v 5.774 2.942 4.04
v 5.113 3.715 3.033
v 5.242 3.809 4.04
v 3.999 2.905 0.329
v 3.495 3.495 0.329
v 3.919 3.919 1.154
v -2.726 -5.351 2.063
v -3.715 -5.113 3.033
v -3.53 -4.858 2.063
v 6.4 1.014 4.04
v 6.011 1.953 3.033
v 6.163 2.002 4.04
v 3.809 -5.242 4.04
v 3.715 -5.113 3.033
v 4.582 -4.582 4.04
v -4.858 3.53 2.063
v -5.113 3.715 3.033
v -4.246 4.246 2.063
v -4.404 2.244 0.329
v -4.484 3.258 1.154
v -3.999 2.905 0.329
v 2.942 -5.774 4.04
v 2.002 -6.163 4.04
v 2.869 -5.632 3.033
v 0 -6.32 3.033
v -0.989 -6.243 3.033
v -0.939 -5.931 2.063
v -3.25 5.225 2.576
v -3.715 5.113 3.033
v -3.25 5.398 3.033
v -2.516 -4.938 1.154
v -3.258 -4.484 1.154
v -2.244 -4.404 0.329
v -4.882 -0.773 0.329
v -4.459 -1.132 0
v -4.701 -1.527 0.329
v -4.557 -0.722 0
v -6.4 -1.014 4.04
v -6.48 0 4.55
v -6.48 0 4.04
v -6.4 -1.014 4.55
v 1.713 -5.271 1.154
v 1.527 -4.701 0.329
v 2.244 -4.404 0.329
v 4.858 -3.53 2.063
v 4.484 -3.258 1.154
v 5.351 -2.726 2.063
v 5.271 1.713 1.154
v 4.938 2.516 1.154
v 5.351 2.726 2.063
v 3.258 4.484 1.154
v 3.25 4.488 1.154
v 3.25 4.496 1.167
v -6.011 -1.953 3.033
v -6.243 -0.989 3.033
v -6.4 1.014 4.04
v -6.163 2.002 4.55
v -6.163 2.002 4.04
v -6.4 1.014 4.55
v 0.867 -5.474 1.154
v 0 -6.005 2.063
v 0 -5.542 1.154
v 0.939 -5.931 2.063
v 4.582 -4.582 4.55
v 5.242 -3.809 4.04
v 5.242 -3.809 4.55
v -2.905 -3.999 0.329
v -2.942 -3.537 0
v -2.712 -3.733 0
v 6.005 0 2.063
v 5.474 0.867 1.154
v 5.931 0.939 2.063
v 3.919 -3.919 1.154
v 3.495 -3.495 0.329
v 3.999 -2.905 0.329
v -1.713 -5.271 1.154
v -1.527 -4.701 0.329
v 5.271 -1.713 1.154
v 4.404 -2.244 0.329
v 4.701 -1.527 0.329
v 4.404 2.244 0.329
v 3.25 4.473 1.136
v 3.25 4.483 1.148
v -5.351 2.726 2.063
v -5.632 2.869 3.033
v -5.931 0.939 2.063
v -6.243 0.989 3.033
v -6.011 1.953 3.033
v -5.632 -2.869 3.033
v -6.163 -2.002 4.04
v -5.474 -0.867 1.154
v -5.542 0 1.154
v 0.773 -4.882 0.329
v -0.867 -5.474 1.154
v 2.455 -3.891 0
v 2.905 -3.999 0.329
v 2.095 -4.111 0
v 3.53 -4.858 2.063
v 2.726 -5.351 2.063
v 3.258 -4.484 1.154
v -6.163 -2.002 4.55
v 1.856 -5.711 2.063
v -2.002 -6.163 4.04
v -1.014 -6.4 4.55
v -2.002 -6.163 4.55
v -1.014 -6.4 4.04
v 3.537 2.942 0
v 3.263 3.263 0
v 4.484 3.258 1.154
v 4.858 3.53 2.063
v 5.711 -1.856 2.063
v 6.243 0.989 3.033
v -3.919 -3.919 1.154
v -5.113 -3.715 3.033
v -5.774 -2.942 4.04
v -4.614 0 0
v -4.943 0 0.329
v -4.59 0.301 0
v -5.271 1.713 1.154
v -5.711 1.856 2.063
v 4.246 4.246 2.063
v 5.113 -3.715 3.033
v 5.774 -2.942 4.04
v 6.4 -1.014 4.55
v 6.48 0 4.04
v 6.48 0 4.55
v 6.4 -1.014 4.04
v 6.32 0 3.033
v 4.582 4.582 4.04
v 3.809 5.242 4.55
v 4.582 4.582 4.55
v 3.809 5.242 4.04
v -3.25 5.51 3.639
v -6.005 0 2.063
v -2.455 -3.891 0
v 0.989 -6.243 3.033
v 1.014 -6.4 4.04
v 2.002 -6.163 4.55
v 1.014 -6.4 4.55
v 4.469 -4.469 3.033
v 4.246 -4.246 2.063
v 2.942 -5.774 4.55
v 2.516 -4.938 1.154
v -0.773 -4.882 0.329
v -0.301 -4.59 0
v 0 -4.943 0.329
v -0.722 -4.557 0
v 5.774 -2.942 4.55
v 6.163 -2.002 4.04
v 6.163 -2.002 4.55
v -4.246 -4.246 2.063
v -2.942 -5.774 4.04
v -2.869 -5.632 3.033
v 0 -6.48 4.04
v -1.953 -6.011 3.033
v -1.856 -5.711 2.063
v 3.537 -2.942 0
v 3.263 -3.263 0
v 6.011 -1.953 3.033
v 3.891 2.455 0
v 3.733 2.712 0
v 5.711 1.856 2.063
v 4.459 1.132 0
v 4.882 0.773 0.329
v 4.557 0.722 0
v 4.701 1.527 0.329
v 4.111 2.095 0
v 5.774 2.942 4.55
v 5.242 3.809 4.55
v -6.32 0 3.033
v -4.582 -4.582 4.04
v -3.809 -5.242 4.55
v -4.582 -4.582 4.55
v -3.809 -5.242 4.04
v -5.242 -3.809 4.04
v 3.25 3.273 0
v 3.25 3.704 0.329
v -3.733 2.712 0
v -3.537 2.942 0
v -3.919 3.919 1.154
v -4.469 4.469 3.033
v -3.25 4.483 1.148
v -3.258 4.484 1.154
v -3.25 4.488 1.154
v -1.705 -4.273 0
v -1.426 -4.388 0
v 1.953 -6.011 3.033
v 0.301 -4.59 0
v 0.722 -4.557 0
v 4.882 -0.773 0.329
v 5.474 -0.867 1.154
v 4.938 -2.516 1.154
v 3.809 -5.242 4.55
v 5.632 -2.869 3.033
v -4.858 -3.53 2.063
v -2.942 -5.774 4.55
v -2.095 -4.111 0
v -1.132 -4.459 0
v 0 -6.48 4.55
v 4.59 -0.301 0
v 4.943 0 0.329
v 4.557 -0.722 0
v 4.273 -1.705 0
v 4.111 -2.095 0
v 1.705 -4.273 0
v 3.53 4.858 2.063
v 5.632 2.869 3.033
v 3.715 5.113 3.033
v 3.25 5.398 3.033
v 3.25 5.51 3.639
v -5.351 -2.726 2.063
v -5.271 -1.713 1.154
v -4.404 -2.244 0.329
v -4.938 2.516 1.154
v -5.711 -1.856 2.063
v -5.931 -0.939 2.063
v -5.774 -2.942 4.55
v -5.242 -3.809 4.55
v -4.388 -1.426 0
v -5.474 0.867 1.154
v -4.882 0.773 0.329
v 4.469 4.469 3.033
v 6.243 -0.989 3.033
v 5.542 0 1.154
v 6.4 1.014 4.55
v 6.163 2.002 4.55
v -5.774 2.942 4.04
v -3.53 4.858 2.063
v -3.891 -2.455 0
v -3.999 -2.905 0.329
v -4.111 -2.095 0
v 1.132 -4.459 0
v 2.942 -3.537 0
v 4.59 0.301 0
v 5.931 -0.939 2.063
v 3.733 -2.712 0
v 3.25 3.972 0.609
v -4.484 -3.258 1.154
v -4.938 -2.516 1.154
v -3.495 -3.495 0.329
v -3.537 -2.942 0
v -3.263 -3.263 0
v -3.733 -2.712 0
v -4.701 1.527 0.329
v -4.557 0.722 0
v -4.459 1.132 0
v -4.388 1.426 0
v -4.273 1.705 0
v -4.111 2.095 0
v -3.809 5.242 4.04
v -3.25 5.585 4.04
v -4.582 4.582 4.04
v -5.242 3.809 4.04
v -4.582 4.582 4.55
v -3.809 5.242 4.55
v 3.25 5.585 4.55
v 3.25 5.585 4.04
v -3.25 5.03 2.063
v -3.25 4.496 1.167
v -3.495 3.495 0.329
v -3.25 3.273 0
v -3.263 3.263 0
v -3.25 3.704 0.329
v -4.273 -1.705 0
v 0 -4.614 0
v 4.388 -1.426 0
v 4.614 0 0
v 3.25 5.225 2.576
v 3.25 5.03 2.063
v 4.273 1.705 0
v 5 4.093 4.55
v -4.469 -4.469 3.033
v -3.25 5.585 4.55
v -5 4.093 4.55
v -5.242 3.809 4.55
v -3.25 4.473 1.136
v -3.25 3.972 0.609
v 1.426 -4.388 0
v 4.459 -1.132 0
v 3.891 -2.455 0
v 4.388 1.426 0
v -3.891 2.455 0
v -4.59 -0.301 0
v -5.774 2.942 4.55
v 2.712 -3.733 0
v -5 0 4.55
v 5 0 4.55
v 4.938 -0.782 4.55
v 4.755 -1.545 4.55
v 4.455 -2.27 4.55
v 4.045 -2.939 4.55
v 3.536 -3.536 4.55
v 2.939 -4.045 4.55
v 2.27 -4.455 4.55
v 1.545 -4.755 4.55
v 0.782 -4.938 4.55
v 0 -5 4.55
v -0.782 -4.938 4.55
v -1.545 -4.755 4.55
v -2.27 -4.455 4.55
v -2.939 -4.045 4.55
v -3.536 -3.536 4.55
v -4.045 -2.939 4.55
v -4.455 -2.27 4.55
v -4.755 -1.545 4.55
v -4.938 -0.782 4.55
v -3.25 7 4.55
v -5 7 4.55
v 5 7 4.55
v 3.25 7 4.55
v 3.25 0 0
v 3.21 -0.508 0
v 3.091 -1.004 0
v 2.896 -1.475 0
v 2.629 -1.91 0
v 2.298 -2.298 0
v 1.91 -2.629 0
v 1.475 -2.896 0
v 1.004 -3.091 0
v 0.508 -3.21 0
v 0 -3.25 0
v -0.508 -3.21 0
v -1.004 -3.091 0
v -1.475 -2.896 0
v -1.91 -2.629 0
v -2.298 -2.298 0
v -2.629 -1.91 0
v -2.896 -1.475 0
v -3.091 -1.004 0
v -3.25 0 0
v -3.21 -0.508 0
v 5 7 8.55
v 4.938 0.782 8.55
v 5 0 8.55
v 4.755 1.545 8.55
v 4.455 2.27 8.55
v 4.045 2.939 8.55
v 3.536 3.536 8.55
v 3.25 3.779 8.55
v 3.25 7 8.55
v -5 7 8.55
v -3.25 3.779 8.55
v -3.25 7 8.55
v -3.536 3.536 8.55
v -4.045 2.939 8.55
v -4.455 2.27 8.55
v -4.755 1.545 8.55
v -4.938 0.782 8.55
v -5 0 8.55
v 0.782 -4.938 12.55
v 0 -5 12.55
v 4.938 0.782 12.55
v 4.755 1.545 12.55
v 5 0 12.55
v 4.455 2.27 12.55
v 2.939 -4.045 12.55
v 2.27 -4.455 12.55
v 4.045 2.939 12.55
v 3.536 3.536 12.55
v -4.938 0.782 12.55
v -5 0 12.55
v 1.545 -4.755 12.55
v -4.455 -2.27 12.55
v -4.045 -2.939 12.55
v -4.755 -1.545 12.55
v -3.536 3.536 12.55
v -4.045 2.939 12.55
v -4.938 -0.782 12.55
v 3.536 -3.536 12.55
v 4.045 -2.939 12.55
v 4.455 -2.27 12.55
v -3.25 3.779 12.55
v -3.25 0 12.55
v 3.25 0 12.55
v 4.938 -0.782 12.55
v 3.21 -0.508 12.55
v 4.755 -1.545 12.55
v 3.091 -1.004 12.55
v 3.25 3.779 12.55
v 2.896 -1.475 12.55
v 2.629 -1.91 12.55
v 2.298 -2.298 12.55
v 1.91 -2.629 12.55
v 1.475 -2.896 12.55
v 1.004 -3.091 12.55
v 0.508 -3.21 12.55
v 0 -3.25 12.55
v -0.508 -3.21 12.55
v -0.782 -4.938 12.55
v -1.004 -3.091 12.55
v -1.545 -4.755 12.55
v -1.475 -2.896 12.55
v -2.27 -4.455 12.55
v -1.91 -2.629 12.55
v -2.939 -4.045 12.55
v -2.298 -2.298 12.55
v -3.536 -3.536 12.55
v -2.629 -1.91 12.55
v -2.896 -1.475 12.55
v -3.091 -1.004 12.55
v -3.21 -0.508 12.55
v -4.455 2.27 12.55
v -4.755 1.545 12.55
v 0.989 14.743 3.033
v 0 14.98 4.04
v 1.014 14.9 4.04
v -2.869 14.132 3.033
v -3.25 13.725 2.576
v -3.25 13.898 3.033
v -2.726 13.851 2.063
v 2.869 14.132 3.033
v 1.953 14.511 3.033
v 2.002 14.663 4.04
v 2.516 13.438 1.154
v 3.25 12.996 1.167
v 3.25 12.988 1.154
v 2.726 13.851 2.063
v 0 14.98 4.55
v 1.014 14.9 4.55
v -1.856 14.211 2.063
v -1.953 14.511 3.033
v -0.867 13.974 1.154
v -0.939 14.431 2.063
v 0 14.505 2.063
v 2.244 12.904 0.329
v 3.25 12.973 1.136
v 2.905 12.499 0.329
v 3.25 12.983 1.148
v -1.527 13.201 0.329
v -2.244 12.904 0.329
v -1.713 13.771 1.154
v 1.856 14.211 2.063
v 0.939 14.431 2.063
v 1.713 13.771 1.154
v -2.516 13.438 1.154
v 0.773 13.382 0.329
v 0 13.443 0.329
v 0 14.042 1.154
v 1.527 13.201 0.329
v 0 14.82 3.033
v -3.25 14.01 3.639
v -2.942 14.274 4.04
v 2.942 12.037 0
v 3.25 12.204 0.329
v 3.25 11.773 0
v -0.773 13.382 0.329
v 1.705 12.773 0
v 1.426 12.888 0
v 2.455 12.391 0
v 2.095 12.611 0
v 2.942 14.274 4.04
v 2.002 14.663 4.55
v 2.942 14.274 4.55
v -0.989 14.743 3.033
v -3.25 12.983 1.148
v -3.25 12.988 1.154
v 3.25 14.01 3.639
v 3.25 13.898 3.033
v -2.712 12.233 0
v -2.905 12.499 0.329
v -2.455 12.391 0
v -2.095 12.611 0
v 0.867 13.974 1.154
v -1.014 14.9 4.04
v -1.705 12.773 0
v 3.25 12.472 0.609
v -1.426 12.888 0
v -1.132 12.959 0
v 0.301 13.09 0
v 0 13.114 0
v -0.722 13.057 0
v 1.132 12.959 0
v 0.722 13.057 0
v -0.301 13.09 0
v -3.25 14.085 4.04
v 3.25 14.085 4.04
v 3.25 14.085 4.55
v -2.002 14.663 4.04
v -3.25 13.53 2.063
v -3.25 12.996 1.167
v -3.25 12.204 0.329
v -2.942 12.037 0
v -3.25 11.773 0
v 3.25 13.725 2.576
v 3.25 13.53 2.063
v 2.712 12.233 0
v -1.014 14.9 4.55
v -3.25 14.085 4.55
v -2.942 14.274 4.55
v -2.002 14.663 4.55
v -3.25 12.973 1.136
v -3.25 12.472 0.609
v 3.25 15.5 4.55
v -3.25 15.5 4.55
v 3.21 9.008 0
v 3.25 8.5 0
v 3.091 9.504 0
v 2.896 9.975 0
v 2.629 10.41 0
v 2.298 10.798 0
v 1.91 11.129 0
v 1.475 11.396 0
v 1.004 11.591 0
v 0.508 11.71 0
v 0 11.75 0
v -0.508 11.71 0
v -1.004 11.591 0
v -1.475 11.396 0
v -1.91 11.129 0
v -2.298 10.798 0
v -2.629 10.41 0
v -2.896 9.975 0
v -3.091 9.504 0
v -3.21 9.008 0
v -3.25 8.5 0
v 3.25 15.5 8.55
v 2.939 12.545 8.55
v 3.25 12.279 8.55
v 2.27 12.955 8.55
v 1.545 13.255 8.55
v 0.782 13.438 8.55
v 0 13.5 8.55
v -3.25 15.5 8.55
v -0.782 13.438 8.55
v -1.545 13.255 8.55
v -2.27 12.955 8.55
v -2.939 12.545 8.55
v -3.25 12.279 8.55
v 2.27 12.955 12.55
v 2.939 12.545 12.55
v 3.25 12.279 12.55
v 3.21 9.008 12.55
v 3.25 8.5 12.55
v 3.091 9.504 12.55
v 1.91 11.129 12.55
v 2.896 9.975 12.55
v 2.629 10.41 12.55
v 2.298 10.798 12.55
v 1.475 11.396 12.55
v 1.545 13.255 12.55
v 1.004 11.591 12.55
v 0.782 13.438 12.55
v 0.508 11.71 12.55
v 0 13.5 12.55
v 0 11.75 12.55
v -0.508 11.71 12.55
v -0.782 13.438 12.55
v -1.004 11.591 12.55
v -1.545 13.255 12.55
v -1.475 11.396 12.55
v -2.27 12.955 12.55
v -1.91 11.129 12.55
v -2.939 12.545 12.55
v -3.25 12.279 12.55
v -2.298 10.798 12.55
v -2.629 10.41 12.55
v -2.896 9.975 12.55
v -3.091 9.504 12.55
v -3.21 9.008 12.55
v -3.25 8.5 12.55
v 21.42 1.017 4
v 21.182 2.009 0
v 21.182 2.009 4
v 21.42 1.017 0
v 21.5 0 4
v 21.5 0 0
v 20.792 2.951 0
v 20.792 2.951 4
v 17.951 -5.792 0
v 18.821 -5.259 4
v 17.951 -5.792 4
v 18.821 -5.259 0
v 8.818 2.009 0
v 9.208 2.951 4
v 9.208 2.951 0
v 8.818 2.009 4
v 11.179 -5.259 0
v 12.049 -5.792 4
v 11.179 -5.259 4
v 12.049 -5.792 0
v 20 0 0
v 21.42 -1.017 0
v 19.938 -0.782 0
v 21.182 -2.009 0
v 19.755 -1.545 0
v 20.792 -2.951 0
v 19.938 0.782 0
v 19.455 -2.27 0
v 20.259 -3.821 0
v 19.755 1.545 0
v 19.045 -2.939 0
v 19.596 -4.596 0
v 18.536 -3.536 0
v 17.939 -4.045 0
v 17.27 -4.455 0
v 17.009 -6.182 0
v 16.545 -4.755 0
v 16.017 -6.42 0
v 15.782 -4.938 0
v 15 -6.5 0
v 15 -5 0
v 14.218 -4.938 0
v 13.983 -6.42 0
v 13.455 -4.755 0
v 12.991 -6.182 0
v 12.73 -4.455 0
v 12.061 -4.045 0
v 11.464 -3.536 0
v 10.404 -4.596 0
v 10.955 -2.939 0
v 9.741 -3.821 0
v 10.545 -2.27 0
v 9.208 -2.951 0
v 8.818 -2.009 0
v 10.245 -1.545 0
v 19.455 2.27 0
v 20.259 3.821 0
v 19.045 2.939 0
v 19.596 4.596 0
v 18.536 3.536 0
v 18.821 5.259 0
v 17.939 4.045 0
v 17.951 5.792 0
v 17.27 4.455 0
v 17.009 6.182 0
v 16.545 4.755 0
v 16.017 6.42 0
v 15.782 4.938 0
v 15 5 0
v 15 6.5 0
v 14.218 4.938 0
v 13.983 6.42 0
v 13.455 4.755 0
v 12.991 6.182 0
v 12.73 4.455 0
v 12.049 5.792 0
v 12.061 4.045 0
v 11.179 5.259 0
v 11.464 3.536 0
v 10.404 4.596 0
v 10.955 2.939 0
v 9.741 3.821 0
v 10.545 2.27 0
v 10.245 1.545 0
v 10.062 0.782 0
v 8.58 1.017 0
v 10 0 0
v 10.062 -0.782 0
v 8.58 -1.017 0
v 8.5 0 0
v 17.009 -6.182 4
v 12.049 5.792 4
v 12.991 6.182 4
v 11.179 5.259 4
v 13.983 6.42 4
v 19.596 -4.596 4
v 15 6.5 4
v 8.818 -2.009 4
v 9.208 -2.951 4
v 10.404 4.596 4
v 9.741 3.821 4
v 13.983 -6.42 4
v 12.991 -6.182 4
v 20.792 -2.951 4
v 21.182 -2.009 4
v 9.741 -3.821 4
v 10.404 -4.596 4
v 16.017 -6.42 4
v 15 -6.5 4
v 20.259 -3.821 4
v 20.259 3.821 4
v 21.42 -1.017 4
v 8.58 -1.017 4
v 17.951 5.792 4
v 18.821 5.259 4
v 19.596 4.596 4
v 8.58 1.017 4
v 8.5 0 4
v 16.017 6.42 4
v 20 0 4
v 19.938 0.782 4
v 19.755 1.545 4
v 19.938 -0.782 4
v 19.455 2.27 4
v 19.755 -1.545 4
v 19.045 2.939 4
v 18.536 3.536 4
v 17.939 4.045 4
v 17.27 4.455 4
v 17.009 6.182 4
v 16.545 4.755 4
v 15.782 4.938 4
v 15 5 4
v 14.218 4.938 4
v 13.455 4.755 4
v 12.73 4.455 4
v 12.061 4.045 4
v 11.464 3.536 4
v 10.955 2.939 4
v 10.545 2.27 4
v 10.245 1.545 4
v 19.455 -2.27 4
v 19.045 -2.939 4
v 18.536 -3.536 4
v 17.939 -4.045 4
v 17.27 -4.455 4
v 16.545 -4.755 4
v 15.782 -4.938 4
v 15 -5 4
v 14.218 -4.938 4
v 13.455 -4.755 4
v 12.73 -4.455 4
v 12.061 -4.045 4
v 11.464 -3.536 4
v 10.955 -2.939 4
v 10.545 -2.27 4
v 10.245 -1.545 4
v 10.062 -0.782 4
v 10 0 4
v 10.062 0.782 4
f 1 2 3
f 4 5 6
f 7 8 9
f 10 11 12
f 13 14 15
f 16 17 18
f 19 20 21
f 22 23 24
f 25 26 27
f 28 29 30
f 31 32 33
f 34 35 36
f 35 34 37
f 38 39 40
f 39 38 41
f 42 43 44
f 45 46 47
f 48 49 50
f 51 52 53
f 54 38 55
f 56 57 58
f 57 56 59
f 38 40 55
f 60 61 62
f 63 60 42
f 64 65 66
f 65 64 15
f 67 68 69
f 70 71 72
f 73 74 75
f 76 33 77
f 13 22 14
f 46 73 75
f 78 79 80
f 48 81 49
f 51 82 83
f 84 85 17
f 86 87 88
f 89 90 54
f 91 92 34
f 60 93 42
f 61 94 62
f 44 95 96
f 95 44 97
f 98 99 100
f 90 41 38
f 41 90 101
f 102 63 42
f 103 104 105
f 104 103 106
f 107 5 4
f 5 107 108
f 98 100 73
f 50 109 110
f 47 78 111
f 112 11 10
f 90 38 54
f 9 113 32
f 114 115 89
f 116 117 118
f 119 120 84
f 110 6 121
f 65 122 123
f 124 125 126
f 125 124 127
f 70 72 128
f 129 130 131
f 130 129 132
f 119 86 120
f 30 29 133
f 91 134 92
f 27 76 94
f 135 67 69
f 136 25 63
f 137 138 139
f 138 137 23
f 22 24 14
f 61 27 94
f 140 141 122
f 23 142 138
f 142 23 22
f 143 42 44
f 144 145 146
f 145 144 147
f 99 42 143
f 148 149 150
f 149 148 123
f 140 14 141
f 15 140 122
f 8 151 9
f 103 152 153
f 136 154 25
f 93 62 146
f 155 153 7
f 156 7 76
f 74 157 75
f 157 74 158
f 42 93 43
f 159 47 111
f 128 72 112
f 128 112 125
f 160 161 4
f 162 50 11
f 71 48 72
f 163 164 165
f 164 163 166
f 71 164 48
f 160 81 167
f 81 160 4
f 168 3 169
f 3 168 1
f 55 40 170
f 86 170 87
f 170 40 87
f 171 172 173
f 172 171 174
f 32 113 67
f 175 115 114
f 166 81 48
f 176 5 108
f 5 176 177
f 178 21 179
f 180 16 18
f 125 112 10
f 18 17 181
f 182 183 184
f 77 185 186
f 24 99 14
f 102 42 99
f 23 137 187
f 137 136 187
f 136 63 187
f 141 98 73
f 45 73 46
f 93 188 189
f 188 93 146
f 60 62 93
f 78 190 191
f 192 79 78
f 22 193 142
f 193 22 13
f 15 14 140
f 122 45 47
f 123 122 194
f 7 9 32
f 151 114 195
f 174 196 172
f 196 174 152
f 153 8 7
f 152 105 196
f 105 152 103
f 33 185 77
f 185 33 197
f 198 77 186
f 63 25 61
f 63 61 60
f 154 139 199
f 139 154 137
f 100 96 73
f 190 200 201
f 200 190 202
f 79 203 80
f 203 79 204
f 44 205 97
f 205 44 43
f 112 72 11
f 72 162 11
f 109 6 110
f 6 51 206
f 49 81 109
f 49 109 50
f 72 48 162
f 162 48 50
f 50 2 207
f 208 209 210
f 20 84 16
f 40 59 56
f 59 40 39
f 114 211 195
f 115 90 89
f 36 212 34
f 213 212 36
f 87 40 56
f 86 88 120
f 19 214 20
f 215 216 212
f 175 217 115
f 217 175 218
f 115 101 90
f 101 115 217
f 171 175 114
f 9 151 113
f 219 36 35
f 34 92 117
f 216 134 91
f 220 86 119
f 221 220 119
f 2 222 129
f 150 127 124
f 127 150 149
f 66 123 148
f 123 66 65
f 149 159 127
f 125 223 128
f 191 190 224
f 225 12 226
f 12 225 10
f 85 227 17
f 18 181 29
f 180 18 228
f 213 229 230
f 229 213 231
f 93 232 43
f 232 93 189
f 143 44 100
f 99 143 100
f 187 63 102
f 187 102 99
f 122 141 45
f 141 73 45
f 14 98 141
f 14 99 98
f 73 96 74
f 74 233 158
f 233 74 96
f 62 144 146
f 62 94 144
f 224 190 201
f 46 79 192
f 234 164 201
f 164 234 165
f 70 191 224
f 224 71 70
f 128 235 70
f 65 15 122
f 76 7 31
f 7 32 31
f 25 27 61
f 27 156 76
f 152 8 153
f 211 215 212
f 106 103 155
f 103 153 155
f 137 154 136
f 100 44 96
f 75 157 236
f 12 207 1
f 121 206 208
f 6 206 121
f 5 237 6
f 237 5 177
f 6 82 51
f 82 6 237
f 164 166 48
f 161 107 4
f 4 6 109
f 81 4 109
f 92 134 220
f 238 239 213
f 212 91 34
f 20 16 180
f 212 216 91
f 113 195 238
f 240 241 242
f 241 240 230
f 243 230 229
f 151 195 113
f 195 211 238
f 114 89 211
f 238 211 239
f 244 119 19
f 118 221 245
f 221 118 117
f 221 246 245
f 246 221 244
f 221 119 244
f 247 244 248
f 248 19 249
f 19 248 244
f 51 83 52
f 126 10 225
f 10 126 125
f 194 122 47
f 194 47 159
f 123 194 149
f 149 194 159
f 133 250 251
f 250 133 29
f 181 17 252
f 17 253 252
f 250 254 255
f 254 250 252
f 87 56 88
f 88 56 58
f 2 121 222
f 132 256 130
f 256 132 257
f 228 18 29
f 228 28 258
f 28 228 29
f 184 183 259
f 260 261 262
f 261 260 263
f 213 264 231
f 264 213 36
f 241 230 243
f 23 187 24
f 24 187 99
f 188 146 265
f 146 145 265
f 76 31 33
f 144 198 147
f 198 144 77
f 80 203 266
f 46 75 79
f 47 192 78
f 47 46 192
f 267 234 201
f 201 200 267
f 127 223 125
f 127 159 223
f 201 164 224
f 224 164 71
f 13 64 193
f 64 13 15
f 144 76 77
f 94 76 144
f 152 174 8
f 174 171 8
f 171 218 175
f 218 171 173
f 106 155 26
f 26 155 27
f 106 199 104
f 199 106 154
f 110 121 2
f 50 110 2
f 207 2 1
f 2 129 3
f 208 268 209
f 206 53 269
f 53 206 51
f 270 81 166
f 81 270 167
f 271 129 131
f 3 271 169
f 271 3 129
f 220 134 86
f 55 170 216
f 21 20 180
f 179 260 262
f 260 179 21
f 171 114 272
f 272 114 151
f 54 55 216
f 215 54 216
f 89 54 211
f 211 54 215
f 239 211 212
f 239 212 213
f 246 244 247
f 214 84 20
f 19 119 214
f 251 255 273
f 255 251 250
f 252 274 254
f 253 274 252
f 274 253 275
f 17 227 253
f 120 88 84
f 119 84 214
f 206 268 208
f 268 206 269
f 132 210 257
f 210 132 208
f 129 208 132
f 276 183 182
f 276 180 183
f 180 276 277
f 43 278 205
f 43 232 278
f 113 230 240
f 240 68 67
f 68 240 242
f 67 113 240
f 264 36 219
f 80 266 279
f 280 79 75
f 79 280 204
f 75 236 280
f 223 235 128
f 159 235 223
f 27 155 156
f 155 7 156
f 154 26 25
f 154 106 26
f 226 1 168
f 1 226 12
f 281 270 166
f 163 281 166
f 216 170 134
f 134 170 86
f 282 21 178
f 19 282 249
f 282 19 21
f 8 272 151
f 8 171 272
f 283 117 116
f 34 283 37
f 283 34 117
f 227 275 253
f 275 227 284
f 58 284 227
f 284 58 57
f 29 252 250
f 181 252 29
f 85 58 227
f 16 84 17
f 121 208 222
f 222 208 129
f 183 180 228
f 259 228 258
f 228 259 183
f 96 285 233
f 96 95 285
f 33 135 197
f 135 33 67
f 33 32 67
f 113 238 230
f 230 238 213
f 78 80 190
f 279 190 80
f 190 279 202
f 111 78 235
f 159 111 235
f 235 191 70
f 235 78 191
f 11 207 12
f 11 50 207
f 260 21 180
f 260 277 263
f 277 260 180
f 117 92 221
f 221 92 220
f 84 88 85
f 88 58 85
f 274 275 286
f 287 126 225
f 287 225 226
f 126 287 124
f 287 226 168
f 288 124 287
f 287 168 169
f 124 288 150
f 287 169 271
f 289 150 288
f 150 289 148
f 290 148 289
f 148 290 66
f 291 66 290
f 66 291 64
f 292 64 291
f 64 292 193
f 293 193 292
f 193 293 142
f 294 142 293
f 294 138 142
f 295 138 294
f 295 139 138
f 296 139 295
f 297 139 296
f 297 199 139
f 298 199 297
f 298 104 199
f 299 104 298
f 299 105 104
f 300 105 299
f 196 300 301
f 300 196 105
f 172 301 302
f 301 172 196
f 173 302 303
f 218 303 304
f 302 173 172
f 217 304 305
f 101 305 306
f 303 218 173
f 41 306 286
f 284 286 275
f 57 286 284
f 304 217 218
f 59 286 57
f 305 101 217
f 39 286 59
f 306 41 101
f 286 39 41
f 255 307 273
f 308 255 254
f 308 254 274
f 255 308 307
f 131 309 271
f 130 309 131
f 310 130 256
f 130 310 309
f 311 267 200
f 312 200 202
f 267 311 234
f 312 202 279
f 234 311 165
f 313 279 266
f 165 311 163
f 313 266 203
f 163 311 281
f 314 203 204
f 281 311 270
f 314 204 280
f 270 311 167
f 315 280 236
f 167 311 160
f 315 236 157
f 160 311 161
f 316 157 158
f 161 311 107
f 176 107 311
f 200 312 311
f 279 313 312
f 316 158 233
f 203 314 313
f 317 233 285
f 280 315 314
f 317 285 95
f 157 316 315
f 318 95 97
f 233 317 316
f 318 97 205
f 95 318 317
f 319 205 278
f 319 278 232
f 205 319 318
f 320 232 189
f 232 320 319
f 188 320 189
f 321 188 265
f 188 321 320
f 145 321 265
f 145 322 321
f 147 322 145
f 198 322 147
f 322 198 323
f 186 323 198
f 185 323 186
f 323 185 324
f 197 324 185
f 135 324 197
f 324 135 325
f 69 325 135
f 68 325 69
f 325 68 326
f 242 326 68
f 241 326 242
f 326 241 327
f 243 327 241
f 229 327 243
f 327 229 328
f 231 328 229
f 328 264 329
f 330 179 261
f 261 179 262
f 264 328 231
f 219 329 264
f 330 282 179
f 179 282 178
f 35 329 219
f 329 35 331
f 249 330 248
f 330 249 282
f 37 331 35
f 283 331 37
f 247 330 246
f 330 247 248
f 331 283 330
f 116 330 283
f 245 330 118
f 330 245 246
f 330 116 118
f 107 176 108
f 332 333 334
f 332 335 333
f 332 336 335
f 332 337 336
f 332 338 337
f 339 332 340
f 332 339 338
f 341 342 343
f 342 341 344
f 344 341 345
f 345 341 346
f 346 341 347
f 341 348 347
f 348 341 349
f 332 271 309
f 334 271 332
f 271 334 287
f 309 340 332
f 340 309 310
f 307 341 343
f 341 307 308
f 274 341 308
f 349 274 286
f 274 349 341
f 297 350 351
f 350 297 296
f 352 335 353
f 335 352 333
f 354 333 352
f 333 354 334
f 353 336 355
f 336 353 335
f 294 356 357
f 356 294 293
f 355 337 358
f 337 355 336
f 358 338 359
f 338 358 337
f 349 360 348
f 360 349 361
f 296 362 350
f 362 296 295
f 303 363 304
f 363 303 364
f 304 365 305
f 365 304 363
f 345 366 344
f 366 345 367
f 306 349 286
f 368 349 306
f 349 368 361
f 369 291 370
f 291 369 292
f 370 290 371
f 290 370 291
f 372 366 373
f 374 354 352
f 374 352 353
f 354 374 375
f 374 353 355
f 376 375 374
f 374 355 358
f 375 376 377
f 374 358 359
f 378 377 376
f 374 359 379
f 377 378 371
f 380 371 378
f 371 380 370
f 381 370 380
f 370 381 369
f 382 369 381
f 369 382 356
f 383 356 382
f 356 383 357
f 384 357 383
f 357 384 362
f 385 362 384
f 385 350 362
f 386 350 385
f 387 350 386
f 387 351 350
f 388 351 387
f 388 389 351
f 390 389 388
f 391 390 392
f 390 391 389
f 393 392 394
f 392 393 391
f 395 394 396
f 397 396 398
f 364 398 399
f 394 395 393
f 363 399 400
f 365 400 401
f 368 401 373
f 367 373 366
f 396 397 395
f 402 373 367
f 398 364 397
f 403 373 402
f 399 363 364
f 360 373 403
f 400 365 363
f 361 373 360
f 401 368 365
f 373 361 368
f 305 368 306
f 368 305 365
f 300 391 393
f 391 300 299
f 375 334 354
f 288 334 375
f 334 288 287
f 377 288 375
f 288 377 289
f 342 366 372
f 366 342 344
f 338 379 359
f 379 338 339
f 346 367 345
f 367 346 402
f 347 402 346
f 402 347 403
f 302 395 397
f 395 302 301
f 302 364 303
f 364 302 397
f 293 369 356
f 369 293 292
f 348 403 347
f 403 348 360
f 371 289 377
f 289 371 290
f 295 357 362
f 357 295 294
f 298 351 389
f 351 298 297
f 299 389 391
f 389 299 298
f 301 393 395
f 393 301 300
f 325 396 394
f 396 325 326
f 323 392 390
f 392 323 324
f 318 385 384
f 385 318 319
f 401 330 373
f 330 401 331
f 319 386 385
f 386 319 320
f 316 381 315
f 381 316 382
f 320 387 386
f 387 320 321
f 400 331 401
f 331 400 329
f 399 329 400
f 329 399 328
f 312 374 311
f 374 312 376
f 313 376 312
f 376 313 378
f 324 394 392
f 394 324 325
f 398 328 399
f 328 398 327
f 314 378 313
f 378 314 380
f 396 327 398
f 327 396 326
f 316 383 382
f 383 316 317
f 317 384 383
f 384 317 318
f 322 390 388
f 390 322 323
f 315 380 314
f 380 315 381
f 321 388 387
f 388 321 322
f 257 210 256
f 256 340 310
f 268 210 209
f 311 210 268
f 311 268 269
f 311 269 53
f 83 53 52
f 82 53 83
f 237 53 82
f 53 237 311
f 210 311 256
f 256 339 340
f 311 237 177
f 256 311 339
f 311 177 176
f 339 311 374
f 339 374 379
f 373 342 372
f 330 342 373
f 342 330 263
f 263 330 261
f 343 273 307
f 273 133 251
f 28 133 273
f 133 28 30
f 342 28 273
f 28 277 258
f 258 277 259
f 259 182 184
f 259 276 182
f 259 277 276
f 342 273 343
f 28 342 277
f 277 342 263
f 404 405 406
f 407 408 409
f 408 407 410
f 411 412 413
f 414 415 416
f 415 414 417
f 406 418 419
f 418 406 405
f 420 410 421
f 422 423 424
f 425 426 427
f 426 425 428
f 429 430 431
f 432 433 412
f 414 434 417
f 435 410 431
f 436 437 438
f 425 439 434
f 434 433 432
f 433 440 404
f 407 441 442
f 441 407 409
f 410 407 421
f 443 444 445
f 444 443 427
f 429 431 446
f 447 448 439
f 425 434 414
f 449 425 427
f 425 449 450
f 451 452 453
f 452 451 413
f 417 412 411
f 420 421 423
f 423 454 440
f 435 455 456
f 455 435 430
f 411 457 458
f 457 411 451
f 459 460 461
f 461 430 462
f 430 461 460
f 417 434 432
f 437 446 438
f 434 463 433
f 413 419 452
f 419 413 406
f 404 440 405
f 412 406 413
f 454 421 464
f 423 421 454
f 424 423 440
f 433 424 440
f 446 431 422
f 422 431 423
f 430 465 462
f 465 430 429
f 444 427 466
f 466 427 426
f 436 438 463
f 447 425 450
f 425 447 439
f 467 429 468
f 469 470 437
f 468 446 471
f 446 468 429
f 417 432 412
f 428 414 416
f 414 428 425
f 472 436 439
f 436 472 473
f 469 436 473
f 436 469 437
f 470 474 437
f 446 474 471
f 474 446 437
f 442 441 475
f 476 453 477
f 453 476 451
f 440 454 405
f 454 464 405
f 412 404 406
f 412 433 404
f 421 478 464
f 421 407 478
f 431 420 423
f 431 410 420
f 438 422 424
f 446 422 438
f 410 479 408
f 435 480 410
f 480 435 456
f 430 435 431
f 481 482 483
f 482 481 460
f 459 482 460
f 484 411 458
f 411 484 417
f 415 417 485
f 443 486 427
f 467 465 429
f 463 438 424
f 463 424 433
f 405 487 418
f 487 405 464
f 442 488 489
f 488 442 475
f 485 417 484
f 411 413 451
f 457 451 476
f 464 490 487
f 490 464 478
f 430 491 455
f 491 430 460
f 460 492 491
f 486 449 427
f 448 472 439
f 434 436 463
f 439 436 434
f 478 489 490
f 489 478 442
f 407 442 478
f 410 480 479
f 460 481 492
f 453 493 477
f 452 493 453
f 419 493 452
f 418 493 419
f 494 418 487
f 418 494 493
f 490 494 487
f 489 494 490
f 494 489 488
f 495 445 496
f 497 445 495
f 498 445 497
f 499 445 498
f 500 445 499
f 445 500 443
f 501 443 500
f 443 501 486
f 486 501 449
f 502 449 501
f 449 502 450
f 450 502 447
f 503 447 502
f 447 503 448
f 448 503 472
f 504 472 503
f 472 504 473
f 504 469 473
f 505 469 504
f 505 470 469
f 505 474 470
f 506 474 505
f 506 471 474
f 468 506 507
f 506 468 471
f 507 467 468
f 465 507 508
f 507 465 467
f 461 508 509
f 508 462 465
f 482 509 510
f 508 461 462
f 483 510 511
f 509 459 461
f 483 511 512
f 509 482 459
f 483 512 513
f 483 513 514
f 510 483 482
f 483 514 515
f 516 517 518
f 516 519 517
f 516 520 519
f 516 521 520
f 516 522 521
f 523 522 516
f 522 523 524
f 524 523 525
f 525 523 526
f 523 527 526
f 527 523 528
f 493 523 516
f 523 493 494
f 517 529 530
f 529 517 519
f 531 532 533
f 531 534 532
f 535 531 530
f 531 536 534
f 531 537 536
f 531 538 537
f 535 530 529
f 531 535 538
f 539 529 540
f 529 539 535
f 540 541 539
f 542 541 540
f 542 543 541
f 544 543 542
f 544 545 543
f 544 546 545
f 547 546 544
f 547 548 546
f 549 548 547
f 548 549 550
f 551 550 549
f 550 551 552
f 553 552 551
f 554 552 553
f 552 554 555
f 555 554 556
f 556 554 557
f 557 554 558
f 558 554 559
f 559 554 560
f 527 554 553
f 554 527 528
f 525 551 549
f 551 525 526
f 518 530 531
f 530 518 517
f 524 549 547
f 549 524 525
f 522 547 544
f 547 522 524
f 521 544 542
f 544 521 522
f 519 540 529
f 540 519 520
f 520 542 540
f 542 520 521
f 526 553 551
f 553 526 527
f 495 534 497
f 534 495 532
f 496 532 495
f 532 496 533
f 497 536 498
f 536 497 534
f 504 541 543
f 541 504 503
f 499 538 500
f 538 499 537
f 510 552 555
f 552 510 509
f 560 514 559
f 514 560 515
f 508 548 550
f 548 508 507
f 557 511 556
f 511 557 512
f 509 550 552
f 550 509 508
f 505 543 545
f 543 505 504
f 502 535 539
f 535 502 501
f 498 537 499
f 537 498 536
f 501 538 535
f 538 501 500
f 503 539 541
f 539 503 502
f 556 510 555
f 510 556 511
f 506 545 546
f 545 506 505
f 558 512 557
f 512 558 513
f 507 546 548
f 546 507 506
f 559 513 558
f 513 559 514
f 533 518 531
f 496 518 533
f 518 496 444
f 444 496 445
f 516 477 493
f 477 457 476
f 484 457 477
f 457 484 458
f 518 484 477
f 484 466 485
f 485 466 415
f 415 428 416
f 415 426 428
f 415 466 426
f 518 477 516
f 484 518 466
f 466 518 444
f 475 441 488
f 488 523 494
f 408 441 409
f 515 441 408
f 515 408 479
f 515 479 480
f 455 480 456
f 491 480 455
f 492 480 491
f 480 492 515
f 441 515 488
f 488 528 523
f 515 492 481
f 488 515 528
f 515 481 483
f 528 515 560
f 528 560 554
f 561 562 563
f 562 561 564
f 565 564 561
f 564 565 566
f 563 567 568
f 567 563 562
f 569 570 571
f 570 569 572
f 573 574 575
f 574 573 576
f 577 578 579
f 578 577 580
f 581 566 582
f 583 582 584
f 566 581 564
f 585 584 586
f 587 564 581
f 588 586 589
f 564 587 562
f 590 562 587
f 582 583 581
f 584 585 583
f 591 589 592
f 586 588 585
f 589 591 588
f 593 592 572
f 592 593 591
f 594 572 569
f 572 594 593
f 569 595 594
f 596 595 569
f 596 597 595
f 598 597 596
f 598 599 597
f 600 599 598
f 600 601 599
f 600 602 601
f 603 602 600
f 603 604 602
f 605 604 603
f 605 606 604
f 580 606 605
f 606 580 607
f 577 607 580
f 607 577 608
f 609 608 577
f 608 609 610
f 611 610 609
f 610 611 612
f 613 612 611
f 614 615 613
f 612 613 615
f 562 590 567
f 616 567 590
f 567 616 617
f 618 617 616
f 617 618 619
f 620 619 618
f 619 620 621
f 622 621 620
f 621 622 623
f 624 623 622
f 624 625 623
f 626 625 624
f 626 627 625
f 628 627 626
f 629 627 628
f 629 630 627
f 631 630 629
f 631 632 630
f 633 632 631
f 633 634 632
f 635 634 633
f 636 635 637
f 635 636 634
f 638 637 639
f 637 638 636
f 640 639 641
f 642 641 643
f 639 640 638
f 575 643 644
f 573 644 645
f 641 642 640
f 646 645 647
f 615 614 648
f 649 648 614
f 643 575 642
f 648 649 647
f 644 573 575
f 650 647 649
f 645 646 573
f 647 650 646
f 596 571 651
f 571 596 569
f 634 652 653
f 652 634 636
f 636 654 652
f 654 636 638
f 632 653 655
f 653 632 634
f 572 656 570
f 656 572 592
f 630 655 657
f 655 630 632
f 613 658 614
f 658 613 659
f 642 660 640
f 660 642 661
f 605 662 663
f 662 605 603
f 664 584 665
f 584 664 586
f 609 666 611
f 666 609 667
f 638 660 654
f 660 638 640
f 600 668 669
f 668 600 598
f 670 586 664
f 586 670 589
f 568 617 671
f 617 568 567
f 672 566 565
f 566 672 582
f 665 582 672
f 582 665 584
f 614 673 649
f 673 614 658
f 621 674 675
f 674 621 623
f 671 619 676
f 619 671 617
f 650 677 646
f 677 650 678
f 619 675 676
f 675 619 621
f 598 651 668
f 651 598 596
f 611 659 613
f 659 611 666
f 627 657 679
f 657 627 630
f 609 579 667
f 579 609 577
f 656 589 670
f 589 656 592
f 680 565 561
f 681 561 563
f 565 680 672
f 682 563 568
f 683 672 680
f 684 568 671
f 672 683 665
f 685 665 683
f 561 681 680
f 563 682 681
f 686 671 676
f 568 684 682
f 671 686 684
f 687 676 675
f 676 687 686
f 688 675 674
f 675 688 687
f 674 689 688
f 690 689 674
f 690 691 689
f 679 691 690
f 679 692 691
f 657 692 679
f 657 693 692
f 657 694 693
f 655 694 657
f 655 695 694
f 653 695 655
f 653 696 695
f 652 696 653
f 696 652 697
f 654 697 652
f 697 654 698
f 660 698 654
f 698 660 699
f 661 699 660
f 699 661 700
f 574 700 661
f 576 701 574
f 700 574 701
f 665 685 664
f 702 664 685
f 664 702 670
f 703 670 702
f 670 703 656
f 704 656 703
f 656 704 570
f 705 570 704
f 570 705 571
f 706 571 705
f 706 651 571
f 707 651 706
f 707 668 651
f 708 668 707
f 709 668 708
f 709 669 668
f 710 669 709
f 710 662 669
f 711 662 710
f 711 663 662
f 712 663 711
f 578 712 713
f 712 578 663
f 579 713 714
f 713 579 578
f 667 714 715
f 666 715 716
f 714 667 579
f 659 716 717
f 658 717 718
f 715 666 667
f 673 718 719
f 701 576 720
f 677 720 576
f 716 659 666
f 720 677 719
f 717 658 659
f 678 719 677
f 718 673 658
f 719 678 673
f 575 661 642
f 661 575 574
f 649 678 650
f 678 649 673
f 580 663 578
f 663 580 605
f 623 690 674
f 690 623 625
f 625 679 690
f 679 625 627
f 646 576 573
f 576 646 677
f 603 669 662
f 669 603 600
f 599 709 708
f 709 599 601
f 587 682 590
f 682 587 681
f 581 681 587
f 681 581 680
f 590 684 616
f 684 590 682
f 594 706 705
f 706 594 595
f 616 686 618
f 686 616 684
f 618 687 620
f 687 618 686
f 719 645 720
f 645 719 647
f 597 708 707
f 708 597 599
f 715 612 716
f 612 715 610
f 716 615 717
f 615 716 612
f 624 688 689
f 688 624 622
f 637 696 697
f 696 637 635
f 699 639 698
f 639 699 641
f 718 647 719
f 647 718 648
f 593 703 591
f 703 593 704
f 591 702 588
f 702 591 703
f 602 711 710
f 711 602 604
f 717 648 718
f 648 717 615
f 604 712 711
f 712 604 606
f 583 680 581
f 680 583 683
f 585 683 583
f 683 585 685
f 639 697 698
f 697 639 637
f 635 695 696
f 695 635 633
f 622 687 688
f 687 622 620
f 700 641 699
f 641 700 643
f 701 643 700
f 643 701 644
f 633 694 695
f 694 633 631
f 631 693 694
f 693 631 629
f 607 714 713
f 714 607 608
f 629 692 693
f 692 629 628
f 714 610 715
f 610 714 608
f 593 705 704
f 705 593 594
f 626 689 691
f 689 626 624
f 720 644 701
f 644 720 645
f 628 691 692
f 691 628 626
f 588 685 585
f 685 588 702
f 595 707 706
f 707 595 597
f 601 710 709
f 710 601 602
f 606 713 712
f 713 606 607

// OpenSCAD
id=6.5;
od=10;//id+5;

ll=od*0.8;
hd=od*1.3;
hb=ll*0.6;
cl=ll*0.5;
eh=2;
hh=hd*0.35 /* 0.1 to 0.4 */;

$fn=40;

module gland()difference(){

    union(){
        intersection(){
            translate([0,0,hh])sphere(d=hd);
            translate([-hd/2,-hd/2,0])cube([hd,hd,hh],false);
        }
        rotate([0,0,180])translate([-od/2,-(od+eh-od/2),hh])cube([od,od+eh-od/2,ll/2]);
        translate([0,0,hh])cylinder(ll,d=od);
    }
    translate([0,0,-1])cylinder(ll+hd,d=id);
}

module cut()translate([-id/2,0,-1])cube([id,hd*0.6,ll+hd]);

difference(){
    gland();
    cut();
}

translate([0,hd/2+2,0])intersection(){
    gland();
    cut();
}

translate([hd+2,0,0]){
    difference(){
        cylinder(cl,d=hd);
        translate([0,0,-1])cylinder(cl*2,d=od);
    }
}


//translate([-od/2,-(od+eh-od/2),hh])cube([od,od+eh-od/2,ll]);
